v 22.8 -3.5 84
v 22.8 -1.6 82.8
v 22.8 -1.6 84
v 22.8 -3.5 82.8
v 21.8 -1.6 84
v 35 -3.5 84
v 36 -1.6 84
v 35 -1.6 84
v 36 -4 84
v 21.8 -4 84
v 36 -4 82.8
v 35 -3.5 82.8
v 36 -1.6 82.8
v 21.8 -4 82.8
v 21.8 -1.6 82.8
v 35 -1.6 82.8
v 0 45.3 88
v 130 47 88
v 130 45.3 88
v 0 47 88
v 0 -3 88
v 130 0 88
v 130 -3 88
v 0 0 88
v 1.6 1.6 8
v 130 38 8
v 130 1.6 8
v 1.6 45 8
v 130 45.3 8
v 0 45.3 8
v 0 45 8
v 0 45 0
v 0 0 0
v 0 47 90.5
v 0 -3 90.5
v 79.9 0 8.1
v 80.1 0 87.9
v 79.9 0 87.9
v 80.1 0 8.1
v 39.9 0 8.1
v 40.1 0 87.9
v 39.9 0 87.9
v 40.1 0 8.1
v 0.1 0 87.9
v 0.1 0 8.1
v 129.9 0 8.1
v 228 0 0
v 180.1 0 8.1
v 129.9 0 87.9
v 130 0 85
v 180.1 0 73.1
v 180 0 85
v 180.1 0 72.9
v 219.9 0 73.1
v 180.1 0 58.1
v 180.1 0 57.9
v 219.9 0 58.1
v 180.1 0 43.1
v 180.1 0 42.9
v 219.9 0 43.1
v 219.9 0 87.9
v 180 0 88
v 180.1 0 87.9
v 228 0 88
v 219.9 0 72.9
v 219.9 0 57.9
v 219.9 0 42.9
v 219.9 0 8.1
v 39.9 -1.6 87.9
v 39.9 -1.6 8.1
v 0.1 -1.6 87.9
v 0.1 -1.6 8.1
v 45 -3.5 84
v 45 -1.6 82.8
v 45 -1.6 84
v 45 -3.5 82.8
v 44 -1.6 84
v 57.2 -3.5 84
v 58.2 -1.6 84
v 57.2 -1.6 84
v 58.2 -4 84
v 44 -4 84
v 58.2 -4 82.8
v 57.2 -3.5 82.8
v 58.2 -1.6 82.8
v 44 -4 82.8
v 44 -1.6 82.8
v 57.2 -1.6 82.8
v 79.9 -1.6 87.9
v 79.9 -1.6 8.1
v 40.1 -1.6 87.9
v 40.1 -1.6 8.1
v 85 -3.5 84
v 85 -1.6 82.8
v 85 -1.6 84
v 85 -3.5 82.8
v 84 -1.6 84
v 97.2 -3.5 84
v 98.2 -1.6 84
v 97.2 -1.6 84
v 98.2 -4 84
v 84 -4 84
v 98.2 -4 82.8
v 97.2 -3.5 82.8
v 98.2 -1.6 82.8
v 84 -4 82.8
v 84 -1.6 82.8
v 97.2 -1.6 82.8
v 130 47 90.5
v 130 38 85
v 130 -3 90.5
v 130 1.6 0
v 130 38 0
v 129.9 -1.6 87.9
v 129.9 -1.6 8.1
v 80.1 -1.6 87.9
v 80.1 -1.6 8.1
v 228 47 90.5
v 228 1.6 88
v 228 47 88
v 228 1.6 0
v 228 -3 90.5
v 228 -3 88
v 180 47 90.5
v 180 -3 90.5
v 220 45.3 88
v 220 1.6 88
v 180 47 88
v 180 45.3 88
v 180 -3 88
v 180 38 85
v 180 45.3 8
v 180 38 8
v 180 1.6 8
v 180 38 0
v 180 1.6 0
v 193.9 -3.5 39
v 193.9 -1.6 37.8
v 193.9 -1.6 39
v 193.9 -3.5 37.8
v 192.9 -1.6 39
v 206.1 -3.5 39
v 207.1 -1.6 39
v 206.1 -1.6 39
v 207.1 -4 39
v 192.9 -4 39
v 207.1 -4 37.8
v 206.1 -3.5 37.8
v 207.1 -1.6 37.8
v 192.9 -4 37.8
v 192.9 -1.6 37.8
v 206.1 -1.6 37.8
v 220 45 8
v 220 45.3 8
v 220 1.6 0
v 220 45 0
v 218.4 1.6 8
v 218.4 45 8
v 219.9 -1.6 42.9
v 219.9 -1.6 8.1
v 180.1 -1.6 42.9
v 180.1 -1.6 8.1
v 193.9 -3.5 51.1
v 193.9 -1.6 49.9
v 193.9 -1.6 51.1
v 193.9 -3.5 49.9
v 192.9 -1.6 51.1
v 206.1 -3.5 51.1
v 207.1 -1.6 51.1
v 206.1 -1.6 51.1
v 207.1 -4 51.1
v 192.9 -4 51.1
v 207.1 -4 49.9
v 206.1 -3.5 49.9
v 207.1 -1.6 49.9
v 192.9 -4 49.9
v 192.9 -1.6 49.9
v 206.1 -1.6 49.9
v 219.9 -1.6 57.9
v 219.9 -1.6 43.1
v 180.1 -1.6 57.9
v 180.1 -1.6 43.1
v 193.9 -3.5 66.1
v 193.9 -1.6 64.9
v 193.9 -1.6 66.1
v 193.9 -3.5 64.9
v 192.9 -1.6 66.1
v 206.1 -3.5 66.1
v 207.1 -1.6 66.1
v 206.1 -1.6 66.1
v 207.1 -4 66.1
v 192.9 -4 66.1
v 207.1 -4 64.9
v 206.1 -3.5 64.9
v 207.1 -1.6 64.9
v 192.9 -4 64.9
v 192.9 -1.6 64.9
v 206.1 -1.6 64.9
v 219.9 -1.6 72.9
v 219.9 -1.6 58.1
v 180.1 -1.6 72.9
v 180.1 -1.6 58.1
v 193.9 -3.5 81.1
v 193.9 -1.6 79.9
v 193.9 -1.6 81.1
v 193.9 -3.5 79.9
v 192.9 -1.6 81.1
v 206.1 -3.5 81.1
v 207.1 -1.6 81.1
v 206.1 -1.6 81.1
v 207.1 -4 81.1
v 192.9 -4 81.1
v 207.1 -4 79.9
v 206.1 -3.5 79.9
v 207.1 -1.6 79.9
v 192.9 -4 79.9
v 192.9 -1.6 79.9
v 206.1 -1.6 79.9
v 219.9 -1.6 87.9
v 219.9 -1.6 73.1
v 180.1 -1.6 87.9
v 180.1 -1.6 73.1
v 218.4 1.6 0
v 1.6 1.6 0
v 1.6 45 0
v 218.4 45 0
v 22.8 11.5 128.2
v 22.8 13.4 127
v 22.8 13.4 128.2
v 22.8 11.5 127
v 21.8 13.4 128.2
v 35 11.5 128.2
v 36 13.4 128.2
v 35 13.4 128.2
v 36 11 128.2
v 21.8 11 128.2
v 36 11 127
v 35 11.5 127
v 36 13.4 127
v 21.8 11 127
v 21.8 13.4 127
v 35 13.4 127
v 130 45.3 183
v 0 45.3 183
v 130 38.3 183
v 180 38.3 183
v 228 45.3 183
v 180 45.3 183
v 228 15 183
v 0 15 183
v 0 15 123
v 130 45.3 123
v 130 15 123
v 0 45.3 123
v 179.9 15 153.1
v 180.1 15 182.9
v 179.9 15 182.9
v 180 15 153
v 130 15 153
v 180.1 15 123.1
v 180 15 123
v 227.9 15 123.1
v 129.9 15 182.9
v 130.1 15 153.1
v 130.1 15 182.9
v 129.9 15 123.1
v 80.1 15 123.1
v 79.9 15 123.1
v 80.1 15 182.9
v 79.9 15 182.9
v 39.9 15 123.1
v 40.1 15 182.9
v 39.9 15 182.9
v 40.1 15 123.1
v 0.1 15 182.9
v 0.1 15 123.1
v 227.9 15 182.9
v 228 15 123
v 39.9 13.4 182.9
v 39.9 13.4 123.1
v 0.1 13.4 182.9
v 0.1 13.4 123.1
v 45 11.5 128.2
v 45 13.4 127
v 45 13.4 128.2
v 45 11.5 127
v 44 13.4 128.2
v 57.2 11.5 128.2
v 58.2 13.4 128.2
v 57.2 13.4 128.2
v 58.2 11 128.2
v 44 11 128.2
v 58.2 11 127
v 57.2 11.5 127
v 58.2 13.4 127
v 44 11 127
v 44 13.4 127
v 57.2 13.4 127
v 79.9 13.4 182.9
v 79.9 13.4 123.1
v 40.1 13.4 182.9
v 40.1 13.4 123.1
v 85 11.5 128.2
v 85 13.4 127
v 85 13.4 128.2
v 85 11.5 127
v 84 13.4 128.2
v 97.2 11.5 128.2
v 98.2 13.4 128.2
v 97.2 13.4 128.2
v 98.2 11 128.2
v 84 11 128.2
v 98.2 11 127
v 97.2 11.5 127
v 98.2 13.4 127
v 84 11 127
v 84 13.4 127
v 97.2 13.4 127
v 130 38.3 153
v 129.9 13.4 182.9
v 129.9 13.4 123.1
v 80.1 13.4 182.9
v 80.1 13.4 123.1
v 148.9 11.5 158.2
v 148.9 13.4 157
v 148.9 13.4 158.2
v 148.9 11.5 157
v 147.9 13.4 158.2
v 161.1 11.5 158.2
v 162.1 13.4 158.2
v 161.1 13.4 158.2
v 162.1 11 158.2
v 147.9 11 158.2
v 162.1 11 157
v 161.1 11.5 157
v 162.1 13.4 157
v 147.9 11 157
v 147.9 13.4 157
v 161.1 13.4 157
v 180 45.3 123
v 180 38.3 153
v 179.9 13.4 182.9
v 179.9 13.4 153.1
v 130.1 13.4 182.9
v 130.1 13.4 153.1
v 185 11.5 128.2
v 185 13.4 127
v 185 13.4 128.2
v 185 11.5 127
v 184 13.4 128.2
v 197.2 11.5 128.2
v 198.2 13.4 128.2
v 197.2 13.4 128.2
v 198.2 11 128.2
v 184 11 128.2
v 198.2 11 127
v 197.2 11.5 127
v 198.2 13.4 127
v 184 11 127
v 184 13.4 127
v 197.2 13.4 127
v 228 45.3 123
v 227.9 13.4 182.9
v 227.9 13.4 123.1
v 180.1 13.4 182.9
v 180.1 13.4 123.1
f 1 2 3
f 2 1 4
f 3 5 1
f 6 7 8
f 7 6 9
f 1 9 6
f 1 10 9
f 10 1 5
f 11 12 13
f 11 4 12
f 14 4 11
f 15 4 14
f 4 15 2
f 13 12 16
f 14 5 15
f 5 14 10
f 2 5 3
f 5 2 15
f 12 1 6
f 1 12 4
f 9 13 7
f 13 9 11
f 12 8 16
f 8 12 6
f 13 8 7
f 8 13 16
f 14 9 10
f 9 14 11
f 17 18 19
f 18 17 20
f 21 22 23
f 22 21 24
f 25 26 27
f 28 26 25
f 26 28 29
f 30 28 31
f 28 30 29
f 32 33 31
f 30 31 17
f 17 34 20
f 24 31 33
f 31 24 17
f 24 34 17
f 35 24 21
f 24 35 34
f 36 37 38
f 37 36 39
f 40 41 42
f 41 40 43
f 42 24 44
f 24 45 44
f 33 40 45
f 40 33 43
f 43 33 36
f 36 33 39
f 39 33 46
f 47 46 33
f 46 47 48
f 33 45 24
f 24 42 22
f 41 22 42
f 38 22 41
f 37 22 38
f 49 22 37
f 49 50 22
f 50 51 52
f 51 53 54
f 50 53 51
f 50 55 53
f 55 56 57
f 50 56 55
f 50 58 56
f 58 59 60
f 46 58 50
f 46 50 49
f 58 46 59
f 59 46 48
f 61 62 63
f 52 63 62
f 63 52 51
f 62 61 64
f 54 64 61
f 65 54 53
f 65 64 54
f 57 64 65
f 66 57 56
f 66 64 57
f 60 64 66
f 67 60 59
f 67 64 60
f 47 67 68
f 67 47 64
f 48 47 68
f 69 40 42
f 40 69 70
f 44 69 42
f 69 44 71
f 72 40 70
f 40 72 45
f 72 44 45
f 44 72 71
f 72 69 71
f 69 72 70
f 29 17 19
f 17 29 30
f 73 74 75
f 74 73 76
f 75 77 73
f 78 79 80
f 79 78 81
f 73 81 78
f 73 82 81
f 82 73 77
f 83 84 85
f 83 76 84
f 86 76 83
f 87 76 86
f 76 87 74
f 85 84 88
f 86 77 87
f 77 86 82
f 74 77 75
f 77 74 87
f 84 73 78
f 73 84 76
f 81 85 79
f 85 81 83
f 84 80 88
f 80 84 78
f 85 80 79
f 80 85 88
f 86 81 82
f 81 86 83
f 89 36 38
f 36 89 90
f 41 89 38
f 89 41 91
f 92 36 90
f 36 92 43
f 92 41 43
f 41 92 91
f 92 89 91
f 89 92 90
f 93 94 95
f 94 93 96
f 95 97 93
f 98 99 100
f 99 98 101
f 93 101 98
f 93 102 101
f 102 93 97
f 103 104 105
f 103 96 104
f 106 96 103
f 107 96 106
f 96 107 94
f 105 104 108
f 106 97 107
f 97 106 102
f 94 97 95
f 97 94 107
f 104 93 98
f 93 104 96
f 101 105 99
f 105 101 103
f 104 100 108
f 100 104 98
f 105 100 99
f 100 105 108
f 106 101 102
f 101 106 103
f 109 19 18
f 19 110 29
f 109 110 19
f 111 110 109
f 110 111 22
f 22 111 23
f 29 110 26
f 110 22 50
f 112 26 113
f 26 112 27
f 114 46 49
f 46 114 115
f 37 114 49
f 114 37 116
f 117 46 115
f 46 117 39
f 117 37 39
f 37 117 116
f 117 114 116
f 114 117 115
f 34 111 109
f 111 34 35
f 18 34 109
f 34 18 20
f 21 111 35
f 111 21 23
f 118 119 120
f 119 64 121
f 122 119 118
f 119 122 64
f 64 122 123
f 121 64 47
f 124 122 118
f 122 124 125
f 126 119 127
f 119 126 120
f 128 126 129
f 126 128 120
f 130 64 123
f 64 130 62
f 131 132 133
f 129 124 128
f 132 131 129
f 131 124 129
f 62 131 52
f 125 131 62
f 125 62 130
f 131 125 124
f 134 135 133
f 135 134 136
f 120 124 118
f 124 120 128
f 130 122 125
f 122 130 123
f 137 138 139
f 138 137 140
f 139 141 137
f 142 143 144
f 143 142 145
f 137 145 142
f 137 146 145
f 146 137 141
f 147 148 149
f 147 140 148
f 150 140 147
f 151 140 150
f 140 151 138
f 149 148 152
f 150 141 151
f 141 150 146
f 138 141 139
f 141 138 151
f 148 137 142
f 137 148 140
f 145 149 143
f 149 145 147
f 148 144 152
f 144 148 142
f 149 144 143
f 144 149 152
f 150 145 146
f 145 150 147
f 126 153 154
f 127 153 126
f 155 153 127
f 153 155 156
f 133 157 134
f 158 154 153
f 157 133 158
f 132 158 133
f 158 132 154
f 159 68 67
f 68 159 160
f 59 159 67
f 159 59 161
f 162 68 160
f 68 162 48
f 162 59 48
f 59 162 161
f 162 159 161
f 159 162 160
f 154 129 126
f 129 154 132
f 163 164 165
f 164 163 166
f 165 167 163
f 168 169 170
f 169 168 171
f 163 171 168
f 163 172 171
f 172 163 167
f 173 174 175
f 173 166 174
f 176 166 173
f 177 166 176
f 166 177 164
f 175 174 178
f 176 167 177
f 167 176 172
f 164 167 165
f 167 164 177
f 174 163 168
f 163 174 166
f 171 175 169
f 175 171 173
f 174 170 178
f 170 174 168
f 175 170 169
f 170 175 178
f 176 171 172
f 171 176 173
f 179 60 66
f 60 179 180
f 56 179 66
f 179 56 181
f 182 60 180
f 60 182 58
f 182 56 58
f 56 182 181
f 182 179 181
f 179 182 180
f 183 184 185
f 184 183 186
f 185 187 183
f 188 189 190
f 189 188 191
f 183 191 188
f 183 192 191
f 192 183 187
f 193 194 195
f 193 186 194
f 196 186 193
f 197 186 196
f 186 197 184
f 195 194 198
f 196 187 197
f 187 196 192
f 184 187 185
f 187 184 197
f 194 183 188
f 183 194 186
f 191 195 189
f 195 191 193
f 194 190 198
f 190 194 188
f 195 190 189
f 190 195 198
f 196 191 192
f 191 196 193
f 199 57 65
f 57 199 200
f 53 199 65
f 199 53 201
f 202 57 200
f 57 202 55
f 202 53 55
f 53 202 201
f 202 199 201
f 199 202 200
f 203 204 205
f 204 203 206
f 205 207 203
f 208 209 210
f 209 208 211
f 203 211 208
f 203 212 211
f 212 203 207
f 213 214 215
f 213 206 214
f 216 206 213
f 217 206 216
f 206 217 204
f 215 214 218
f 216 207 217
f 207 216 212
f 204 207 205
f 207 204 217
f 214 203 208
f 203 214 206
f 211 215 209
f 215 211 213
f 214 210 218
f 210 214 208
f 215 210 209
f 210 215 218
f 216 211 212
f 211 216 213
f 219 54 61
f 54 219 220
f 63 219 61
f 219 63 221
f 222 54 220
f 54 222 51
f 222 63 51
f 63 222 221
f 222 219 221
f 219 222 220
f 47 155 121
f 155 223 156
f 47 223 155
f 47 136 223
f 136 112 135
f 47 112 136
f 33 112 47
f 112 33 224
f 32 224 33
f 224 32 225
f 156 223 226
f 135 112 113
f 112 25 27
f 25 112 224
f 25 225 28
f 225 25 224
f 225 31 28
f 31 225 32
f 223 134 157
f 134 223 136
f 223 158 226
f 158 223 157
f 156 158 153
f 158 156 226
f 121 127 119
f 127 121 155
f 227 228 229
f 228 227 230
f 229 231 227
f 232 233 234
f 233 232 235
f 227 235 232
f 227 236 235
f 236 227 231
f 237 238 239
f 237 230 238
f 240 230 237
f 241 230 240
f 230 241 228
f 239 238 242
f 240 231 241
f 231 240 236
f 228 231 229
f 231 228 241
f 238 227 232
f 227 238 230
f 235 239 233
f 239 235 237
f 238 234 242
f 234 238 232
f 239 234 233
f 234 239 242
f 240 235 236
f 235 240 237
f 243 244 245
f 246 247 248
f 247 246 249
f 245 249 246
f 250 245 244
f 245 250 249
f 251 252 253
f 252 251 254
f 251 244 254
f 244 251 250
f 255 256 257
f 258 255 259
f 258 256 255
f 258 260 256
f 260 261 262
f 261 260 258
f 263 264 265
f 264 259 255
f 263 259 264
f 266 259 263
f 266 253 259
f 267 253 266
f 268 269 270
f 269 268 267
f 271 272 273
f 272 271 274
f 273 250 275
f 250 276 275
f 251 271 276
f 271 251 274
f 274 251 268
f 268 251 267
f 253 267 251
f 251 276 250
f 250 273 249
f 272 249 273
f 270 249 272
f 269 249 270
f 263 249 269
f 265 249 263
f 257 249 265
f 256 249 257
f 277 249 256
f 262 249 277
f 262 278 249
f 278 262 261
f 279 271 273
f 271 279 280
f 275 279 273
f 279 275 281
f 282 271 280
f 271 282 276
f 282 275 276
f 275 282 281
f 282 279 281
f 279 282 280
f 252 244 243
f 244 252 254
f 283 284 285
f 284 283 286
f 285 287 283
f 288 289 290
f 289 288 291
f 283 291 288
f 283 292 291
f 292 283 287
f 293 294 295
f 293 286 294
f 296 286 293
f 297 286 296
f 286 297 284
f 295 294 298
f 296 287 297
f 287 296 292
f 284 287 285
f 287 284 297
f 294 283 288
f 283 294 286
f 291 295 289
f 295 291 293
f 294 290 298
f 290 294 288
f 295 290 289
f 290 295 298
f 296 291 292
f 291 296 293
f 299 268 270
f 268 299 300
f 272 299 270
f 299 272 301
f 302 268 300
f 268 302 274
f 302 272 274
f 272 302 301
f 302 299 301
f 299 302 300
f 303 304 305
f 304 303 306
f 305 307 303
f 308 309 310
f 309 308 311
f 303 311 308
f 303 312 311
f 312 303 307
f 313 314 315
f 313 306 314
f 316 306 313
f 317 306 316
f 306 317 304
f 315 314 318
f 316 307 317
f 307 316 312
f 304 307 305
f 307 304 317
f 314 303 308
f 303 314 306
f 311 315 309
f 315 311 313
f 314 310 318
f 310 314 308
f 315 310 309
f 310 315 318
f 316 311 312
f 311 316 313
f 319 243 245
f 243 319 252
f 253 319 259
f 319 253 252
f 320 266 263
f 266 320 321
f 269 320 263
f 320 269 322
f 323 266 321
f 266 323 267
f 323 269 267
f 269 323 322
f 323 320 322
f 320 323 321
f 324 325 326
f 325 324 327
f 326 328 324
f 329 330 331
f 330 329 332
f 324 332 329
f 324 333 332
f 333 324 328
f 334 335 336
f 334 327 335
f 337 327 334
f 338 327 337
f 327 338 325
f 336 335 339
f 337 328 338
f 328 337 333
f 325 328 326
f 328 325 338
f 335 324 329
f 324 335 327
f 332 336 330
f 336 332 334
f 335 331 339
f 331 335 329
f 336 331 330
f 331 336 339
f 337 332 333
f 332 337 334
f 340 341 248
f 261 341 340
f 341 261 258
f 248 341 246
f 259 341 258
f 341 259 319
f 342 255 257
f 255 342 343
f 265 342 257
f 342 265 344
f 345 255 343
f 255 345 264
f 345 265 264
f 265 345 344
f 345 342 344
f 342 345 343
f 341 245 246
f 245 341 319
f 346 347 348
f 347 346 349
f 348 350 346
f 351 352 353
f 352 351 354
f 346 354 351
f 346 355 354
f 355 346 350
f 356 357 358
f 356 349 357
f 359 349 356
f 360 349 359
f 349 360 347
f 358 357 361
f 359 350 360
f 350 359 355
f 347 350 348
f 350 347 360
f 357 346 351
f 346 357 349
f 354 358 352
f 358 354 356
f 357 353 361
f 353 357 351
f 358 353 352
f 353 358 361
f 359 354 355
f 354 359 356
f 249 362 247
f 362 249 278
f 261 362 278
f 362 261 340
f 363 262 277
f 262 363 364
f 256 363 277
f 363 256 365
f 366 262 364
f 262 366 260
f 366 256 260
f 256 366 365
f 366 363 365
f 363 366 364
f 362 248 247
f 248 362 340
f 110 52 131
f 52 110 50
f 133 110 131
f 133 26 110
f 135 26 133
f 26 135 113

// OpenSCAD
// file: ../kitchen.scad
module kitchen_box(w=40, h=60, d=30, ka=-1, kva=-1)
{
	color("lightgray")
	cube([w, d, h]);
	// фасад
	translate([0.1, -1.6, 0.1]) cube([w-0.2, 1.6, h-0.2]);
	// задняя стенка
	color("brown")
	translate([0, d, 0]) cube([w, 0.3, h]);
	// ручка
	KW=14.2; KH=1.2;
	_ka =(ka <0?4: (ka >0?w-4-KW: (w-KW)/2) );
	_kva=(kva<0?4: (kva>0?h-4-KH: (h-KH)/2));
	translate([_ka, -1.6, _kva]) kitchen_knob(KW);
}

module kitchen_knob(KW=14.2)
{
	color("gray")
	{
		translate([0,      -1.9, 0]) cube([1, 1.9, 1.2]);
		translate([14.2-1, -1.9, 0]) cube([1, 1.9, 1.2]);
		translate([0,      -1.9-0.5, 0]) cube([KW, 0.5, 1.2]);
	}
}
// main file
use <../kitchen.scad>;

translate([0, 0, 8])
{
	// нижние ящики
	translate([  0, 0, 0]) kitchen_box(40, h=80, d=45, kva=1, ka=1);
	translate([ 40, 0, 0]) kitchen_box(40, h=80, d=45, kva=1);
	translate([ 80, 0, 0]) kitchen_box(50, h=80, d=45, kva=1);

	// столешница
	color("gray")
	{
		translate([0,   47-50, 80]) cube([130, 50, 2.5]);
		translate([180, 47-50, 80]) cube([48,  50, 2.5]);
	}

	// тумба с ящиками
	{
		translate([  180, 0,  0]) kitchen_box(40, h=35, d=45, ka=0, kva=1);
		translate([  180, 0, 35]) kitchen_box(40, h=15, d=45, ka=0, kva=0);
		translate([  180, 0, 50]) kitchen_box(40, h=15, d=45, ka=0, kva=0);
		translate([  180, 0, 65]) kitchen_box(40, h=15, d=45, ka=0, kva=0);
	}
}
// нижний плинтус
color("gray")
{
	cube([130, 1.6, 8]);
	cube([1.6, 45, 8]);
	translate([180, 0, 0]) cube([40, 1.6, 8]);
	translate([220-1.6, 0, 0]) cube([1.6, 45, 8]);
	// правая щель
	translate([220, 0, 0]) cube([8, 1.6, 88]);
}

// плита
color("white")
translate([130, 0, 0]) cube([50, 38, 85]);

// верхние ящики
translate([0, 45-30, 123])
{
	translate([  0, 0, 0]) kitchen_box(40, ka=1);
	translate([ 40, 0, 0]) kitchen_box(40);
	translate([ 80, 0, 0]) kitchen_box(50);
	translate([130, 0, 60-30]) kitchen_box(50, h=30, d=23, ka=0);
	translate([180, 0, 0]) kitchen_box(48);
}
